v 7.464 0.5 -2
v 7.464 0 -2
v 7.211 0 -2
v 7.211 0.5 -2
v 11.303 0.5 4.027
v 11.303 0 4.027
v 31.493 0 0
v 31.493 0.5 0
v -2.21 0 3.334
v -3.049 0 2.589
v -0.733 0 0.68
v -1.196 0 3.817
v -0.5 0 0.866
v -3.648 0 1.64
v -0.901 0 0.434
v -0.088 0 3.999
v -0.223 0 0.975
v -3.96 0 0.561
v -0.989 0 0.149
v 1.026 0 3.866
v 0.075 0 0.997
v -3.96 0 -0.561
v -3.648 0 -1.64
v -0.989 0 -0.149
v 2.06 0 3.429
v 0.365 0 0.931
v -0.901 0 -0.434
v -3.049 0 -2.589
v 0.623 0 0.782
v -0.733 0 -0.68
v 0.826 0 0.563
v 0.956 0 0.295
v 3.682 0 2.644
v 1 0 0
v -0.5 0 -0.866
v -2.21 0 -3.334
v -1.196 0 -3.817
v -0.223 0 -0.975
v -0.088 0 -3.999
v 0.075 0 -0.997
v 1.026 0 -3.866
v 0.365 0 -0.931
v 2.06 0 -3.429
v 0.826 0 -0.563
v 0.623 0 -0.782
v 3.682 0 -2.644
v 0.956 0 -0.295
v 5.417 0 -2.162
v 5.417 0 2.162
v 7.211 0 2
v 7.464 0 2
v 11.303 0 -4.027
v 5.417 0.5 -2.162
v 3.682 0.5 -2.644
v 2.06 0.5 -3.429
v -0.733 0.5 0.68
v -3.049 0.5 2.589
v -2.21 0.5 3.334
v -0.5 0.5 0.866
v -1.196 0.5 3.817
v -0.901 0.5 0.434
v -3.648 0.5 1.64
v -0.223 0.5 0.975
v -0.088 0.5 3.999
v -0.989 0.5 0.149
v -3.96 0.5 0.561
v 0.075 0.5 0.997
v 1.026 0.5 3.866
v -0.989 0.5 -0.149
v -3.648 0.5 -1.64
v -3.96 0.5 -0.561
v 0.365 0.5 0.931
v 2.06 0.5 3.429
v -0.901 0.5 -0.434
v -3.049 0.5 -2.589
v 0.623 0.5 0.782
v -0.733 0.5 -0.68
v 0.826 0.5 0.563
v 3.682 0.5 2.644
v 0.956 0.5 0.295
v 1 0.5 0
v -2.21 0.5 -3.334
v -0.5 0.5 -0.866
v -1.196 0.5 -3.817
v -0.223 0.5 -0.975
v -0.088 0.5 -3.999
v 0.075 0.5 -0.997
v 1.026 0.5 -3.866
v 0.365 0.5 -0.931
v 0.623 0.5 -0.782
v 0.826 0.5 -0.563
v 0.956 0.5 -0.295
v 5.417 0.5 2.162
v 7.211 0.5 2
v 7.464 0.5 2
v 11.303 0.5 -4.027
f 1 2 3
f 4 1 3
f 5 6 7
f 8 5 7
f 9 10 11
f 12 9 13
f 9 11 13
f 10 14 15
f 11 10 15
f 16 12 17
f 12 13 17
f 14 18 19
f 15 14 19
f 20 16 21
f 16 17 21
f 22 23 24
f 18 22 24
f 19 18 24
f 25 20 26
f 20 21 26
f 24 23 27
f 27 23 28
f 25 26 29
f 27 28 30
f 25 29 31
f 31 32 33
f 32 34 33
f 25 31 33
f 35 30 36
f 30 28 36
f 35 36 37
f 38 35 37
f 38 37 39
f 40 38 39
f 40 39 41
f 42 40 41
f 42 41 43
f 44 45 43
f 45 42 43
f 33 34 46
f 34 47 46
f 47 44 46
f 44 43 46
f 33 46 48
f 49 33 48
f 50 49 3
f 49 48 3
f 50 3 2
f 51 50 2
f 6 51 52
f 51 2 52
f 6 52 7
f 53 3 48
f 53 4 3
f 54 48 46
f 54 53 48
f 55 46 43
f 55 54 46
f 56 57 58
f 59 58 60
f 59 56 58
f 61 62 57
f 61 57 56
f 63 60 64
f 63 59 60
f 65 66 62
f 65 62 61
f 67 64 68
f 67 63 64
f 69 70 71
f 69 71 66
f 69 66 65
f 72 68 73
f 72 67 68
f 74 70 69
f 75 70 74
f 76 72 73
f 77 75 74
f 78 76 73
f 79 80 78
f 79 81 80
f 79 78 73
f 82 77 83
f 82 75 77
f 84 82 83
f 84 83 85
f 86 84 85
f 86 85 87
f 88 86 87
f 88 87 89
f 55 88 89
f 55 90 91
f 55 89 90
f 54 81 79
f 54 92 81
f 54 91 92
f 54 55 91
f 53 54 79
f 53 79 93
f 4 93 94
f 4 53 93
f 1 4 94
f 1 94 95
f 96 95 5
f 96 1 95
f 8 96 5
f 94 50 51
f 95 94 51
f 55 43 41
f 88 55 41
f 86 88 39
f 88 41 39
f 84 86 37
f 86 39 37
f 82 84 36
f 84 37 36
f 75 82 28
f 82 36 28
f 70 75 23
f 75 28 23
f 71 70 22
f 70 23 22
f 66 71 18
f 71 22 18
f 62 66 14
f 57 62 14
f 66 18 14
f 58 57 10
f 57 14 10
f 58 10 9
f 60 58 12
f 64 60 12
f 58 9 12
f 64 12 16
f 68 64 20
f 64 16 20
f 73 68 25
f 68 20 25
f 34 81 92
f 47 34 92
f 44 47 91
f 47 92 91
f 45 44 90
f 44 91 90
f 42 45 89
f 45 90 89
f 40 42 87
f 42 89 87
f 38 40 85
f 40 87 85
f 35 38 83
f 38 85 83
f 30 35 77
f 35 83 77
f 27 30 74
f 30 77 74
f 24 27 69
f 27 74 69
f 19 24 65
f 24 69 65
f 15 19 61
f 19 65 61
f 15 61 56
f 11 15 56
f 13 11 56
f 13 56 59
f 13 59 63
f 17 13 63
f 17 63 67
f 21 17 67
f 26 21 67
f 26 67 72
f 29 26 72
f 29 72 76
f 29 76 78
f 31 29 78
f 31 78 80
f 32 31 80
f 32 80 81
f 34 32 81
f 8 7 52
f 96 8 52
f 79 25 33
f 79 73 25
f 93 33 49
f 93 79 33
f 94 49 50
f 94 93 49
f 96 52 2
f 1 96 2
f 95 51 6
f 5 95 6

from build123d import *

# Parameters (mm, degrees)
SKETCH1_R           = 4
BOSS_EXTRUDE2_DEPTH = 0.5
FILLET1_R           = 10
SKETCH3_R           = 1
CUT_EXTRUDE2_DEPTH  = 1.5


with BuildPart() as part:
    # Sketch1 → Boss-Extrude2 (new body)
    with BuildSketch(Plane(origin=(0, 0, 0), x_dir=(1, 0, 0), z_dir=(0, 1, 0))):
        with BuildLine():
            Line((7.464101615, 2), (3.464101615, 2))
            ThreePointArc((3.464101615, 2), (3.863703305, 1.03527618), (4, 0))
            ThreePointArc((4, 0), (3.863703305, -1.03527618), (3.464101615, -2))
            Line((3.464101615, -2), (7.464101615, -2))
            Line((7.464101615, -2), (11.302617333, -4.027174803))
            Line((11.302617333, -4.027174803), (31.492947109, 0))
            Line((31.492947109, 0), (11.302617333, 4.027174803))
            Line((11.302617333, 4.027174803), (7.464101615, 2))
        make_face()
        Circle(SKETCH1_R)
    extrude(amount=BOSS_EXTRUDE2_DEPTH)

    # Fillet1
    fillet1_edges = [part.edges().sort_by_distance(p)[0] for p in [
        (3.464101615, 0.25, 2),
        (3.464101615, 0.25, -2),
    ]]
    fillet(fillet1_edges, radius=FILLET1_R)

    # Sketch3 → Cut-Extrude2 (cut, through all)
    with BuildSketch(Plane(origin=(0, 0.5, 0), x_dir=(1, 0, 0), z_dir=(0, 1, 0))):
        Circle(SKETCH3_R)
    extrude(amount=-CUT_EXTRUDE2_DEPTH, mode=Mode.SUBTRACT)


solid = part.part
